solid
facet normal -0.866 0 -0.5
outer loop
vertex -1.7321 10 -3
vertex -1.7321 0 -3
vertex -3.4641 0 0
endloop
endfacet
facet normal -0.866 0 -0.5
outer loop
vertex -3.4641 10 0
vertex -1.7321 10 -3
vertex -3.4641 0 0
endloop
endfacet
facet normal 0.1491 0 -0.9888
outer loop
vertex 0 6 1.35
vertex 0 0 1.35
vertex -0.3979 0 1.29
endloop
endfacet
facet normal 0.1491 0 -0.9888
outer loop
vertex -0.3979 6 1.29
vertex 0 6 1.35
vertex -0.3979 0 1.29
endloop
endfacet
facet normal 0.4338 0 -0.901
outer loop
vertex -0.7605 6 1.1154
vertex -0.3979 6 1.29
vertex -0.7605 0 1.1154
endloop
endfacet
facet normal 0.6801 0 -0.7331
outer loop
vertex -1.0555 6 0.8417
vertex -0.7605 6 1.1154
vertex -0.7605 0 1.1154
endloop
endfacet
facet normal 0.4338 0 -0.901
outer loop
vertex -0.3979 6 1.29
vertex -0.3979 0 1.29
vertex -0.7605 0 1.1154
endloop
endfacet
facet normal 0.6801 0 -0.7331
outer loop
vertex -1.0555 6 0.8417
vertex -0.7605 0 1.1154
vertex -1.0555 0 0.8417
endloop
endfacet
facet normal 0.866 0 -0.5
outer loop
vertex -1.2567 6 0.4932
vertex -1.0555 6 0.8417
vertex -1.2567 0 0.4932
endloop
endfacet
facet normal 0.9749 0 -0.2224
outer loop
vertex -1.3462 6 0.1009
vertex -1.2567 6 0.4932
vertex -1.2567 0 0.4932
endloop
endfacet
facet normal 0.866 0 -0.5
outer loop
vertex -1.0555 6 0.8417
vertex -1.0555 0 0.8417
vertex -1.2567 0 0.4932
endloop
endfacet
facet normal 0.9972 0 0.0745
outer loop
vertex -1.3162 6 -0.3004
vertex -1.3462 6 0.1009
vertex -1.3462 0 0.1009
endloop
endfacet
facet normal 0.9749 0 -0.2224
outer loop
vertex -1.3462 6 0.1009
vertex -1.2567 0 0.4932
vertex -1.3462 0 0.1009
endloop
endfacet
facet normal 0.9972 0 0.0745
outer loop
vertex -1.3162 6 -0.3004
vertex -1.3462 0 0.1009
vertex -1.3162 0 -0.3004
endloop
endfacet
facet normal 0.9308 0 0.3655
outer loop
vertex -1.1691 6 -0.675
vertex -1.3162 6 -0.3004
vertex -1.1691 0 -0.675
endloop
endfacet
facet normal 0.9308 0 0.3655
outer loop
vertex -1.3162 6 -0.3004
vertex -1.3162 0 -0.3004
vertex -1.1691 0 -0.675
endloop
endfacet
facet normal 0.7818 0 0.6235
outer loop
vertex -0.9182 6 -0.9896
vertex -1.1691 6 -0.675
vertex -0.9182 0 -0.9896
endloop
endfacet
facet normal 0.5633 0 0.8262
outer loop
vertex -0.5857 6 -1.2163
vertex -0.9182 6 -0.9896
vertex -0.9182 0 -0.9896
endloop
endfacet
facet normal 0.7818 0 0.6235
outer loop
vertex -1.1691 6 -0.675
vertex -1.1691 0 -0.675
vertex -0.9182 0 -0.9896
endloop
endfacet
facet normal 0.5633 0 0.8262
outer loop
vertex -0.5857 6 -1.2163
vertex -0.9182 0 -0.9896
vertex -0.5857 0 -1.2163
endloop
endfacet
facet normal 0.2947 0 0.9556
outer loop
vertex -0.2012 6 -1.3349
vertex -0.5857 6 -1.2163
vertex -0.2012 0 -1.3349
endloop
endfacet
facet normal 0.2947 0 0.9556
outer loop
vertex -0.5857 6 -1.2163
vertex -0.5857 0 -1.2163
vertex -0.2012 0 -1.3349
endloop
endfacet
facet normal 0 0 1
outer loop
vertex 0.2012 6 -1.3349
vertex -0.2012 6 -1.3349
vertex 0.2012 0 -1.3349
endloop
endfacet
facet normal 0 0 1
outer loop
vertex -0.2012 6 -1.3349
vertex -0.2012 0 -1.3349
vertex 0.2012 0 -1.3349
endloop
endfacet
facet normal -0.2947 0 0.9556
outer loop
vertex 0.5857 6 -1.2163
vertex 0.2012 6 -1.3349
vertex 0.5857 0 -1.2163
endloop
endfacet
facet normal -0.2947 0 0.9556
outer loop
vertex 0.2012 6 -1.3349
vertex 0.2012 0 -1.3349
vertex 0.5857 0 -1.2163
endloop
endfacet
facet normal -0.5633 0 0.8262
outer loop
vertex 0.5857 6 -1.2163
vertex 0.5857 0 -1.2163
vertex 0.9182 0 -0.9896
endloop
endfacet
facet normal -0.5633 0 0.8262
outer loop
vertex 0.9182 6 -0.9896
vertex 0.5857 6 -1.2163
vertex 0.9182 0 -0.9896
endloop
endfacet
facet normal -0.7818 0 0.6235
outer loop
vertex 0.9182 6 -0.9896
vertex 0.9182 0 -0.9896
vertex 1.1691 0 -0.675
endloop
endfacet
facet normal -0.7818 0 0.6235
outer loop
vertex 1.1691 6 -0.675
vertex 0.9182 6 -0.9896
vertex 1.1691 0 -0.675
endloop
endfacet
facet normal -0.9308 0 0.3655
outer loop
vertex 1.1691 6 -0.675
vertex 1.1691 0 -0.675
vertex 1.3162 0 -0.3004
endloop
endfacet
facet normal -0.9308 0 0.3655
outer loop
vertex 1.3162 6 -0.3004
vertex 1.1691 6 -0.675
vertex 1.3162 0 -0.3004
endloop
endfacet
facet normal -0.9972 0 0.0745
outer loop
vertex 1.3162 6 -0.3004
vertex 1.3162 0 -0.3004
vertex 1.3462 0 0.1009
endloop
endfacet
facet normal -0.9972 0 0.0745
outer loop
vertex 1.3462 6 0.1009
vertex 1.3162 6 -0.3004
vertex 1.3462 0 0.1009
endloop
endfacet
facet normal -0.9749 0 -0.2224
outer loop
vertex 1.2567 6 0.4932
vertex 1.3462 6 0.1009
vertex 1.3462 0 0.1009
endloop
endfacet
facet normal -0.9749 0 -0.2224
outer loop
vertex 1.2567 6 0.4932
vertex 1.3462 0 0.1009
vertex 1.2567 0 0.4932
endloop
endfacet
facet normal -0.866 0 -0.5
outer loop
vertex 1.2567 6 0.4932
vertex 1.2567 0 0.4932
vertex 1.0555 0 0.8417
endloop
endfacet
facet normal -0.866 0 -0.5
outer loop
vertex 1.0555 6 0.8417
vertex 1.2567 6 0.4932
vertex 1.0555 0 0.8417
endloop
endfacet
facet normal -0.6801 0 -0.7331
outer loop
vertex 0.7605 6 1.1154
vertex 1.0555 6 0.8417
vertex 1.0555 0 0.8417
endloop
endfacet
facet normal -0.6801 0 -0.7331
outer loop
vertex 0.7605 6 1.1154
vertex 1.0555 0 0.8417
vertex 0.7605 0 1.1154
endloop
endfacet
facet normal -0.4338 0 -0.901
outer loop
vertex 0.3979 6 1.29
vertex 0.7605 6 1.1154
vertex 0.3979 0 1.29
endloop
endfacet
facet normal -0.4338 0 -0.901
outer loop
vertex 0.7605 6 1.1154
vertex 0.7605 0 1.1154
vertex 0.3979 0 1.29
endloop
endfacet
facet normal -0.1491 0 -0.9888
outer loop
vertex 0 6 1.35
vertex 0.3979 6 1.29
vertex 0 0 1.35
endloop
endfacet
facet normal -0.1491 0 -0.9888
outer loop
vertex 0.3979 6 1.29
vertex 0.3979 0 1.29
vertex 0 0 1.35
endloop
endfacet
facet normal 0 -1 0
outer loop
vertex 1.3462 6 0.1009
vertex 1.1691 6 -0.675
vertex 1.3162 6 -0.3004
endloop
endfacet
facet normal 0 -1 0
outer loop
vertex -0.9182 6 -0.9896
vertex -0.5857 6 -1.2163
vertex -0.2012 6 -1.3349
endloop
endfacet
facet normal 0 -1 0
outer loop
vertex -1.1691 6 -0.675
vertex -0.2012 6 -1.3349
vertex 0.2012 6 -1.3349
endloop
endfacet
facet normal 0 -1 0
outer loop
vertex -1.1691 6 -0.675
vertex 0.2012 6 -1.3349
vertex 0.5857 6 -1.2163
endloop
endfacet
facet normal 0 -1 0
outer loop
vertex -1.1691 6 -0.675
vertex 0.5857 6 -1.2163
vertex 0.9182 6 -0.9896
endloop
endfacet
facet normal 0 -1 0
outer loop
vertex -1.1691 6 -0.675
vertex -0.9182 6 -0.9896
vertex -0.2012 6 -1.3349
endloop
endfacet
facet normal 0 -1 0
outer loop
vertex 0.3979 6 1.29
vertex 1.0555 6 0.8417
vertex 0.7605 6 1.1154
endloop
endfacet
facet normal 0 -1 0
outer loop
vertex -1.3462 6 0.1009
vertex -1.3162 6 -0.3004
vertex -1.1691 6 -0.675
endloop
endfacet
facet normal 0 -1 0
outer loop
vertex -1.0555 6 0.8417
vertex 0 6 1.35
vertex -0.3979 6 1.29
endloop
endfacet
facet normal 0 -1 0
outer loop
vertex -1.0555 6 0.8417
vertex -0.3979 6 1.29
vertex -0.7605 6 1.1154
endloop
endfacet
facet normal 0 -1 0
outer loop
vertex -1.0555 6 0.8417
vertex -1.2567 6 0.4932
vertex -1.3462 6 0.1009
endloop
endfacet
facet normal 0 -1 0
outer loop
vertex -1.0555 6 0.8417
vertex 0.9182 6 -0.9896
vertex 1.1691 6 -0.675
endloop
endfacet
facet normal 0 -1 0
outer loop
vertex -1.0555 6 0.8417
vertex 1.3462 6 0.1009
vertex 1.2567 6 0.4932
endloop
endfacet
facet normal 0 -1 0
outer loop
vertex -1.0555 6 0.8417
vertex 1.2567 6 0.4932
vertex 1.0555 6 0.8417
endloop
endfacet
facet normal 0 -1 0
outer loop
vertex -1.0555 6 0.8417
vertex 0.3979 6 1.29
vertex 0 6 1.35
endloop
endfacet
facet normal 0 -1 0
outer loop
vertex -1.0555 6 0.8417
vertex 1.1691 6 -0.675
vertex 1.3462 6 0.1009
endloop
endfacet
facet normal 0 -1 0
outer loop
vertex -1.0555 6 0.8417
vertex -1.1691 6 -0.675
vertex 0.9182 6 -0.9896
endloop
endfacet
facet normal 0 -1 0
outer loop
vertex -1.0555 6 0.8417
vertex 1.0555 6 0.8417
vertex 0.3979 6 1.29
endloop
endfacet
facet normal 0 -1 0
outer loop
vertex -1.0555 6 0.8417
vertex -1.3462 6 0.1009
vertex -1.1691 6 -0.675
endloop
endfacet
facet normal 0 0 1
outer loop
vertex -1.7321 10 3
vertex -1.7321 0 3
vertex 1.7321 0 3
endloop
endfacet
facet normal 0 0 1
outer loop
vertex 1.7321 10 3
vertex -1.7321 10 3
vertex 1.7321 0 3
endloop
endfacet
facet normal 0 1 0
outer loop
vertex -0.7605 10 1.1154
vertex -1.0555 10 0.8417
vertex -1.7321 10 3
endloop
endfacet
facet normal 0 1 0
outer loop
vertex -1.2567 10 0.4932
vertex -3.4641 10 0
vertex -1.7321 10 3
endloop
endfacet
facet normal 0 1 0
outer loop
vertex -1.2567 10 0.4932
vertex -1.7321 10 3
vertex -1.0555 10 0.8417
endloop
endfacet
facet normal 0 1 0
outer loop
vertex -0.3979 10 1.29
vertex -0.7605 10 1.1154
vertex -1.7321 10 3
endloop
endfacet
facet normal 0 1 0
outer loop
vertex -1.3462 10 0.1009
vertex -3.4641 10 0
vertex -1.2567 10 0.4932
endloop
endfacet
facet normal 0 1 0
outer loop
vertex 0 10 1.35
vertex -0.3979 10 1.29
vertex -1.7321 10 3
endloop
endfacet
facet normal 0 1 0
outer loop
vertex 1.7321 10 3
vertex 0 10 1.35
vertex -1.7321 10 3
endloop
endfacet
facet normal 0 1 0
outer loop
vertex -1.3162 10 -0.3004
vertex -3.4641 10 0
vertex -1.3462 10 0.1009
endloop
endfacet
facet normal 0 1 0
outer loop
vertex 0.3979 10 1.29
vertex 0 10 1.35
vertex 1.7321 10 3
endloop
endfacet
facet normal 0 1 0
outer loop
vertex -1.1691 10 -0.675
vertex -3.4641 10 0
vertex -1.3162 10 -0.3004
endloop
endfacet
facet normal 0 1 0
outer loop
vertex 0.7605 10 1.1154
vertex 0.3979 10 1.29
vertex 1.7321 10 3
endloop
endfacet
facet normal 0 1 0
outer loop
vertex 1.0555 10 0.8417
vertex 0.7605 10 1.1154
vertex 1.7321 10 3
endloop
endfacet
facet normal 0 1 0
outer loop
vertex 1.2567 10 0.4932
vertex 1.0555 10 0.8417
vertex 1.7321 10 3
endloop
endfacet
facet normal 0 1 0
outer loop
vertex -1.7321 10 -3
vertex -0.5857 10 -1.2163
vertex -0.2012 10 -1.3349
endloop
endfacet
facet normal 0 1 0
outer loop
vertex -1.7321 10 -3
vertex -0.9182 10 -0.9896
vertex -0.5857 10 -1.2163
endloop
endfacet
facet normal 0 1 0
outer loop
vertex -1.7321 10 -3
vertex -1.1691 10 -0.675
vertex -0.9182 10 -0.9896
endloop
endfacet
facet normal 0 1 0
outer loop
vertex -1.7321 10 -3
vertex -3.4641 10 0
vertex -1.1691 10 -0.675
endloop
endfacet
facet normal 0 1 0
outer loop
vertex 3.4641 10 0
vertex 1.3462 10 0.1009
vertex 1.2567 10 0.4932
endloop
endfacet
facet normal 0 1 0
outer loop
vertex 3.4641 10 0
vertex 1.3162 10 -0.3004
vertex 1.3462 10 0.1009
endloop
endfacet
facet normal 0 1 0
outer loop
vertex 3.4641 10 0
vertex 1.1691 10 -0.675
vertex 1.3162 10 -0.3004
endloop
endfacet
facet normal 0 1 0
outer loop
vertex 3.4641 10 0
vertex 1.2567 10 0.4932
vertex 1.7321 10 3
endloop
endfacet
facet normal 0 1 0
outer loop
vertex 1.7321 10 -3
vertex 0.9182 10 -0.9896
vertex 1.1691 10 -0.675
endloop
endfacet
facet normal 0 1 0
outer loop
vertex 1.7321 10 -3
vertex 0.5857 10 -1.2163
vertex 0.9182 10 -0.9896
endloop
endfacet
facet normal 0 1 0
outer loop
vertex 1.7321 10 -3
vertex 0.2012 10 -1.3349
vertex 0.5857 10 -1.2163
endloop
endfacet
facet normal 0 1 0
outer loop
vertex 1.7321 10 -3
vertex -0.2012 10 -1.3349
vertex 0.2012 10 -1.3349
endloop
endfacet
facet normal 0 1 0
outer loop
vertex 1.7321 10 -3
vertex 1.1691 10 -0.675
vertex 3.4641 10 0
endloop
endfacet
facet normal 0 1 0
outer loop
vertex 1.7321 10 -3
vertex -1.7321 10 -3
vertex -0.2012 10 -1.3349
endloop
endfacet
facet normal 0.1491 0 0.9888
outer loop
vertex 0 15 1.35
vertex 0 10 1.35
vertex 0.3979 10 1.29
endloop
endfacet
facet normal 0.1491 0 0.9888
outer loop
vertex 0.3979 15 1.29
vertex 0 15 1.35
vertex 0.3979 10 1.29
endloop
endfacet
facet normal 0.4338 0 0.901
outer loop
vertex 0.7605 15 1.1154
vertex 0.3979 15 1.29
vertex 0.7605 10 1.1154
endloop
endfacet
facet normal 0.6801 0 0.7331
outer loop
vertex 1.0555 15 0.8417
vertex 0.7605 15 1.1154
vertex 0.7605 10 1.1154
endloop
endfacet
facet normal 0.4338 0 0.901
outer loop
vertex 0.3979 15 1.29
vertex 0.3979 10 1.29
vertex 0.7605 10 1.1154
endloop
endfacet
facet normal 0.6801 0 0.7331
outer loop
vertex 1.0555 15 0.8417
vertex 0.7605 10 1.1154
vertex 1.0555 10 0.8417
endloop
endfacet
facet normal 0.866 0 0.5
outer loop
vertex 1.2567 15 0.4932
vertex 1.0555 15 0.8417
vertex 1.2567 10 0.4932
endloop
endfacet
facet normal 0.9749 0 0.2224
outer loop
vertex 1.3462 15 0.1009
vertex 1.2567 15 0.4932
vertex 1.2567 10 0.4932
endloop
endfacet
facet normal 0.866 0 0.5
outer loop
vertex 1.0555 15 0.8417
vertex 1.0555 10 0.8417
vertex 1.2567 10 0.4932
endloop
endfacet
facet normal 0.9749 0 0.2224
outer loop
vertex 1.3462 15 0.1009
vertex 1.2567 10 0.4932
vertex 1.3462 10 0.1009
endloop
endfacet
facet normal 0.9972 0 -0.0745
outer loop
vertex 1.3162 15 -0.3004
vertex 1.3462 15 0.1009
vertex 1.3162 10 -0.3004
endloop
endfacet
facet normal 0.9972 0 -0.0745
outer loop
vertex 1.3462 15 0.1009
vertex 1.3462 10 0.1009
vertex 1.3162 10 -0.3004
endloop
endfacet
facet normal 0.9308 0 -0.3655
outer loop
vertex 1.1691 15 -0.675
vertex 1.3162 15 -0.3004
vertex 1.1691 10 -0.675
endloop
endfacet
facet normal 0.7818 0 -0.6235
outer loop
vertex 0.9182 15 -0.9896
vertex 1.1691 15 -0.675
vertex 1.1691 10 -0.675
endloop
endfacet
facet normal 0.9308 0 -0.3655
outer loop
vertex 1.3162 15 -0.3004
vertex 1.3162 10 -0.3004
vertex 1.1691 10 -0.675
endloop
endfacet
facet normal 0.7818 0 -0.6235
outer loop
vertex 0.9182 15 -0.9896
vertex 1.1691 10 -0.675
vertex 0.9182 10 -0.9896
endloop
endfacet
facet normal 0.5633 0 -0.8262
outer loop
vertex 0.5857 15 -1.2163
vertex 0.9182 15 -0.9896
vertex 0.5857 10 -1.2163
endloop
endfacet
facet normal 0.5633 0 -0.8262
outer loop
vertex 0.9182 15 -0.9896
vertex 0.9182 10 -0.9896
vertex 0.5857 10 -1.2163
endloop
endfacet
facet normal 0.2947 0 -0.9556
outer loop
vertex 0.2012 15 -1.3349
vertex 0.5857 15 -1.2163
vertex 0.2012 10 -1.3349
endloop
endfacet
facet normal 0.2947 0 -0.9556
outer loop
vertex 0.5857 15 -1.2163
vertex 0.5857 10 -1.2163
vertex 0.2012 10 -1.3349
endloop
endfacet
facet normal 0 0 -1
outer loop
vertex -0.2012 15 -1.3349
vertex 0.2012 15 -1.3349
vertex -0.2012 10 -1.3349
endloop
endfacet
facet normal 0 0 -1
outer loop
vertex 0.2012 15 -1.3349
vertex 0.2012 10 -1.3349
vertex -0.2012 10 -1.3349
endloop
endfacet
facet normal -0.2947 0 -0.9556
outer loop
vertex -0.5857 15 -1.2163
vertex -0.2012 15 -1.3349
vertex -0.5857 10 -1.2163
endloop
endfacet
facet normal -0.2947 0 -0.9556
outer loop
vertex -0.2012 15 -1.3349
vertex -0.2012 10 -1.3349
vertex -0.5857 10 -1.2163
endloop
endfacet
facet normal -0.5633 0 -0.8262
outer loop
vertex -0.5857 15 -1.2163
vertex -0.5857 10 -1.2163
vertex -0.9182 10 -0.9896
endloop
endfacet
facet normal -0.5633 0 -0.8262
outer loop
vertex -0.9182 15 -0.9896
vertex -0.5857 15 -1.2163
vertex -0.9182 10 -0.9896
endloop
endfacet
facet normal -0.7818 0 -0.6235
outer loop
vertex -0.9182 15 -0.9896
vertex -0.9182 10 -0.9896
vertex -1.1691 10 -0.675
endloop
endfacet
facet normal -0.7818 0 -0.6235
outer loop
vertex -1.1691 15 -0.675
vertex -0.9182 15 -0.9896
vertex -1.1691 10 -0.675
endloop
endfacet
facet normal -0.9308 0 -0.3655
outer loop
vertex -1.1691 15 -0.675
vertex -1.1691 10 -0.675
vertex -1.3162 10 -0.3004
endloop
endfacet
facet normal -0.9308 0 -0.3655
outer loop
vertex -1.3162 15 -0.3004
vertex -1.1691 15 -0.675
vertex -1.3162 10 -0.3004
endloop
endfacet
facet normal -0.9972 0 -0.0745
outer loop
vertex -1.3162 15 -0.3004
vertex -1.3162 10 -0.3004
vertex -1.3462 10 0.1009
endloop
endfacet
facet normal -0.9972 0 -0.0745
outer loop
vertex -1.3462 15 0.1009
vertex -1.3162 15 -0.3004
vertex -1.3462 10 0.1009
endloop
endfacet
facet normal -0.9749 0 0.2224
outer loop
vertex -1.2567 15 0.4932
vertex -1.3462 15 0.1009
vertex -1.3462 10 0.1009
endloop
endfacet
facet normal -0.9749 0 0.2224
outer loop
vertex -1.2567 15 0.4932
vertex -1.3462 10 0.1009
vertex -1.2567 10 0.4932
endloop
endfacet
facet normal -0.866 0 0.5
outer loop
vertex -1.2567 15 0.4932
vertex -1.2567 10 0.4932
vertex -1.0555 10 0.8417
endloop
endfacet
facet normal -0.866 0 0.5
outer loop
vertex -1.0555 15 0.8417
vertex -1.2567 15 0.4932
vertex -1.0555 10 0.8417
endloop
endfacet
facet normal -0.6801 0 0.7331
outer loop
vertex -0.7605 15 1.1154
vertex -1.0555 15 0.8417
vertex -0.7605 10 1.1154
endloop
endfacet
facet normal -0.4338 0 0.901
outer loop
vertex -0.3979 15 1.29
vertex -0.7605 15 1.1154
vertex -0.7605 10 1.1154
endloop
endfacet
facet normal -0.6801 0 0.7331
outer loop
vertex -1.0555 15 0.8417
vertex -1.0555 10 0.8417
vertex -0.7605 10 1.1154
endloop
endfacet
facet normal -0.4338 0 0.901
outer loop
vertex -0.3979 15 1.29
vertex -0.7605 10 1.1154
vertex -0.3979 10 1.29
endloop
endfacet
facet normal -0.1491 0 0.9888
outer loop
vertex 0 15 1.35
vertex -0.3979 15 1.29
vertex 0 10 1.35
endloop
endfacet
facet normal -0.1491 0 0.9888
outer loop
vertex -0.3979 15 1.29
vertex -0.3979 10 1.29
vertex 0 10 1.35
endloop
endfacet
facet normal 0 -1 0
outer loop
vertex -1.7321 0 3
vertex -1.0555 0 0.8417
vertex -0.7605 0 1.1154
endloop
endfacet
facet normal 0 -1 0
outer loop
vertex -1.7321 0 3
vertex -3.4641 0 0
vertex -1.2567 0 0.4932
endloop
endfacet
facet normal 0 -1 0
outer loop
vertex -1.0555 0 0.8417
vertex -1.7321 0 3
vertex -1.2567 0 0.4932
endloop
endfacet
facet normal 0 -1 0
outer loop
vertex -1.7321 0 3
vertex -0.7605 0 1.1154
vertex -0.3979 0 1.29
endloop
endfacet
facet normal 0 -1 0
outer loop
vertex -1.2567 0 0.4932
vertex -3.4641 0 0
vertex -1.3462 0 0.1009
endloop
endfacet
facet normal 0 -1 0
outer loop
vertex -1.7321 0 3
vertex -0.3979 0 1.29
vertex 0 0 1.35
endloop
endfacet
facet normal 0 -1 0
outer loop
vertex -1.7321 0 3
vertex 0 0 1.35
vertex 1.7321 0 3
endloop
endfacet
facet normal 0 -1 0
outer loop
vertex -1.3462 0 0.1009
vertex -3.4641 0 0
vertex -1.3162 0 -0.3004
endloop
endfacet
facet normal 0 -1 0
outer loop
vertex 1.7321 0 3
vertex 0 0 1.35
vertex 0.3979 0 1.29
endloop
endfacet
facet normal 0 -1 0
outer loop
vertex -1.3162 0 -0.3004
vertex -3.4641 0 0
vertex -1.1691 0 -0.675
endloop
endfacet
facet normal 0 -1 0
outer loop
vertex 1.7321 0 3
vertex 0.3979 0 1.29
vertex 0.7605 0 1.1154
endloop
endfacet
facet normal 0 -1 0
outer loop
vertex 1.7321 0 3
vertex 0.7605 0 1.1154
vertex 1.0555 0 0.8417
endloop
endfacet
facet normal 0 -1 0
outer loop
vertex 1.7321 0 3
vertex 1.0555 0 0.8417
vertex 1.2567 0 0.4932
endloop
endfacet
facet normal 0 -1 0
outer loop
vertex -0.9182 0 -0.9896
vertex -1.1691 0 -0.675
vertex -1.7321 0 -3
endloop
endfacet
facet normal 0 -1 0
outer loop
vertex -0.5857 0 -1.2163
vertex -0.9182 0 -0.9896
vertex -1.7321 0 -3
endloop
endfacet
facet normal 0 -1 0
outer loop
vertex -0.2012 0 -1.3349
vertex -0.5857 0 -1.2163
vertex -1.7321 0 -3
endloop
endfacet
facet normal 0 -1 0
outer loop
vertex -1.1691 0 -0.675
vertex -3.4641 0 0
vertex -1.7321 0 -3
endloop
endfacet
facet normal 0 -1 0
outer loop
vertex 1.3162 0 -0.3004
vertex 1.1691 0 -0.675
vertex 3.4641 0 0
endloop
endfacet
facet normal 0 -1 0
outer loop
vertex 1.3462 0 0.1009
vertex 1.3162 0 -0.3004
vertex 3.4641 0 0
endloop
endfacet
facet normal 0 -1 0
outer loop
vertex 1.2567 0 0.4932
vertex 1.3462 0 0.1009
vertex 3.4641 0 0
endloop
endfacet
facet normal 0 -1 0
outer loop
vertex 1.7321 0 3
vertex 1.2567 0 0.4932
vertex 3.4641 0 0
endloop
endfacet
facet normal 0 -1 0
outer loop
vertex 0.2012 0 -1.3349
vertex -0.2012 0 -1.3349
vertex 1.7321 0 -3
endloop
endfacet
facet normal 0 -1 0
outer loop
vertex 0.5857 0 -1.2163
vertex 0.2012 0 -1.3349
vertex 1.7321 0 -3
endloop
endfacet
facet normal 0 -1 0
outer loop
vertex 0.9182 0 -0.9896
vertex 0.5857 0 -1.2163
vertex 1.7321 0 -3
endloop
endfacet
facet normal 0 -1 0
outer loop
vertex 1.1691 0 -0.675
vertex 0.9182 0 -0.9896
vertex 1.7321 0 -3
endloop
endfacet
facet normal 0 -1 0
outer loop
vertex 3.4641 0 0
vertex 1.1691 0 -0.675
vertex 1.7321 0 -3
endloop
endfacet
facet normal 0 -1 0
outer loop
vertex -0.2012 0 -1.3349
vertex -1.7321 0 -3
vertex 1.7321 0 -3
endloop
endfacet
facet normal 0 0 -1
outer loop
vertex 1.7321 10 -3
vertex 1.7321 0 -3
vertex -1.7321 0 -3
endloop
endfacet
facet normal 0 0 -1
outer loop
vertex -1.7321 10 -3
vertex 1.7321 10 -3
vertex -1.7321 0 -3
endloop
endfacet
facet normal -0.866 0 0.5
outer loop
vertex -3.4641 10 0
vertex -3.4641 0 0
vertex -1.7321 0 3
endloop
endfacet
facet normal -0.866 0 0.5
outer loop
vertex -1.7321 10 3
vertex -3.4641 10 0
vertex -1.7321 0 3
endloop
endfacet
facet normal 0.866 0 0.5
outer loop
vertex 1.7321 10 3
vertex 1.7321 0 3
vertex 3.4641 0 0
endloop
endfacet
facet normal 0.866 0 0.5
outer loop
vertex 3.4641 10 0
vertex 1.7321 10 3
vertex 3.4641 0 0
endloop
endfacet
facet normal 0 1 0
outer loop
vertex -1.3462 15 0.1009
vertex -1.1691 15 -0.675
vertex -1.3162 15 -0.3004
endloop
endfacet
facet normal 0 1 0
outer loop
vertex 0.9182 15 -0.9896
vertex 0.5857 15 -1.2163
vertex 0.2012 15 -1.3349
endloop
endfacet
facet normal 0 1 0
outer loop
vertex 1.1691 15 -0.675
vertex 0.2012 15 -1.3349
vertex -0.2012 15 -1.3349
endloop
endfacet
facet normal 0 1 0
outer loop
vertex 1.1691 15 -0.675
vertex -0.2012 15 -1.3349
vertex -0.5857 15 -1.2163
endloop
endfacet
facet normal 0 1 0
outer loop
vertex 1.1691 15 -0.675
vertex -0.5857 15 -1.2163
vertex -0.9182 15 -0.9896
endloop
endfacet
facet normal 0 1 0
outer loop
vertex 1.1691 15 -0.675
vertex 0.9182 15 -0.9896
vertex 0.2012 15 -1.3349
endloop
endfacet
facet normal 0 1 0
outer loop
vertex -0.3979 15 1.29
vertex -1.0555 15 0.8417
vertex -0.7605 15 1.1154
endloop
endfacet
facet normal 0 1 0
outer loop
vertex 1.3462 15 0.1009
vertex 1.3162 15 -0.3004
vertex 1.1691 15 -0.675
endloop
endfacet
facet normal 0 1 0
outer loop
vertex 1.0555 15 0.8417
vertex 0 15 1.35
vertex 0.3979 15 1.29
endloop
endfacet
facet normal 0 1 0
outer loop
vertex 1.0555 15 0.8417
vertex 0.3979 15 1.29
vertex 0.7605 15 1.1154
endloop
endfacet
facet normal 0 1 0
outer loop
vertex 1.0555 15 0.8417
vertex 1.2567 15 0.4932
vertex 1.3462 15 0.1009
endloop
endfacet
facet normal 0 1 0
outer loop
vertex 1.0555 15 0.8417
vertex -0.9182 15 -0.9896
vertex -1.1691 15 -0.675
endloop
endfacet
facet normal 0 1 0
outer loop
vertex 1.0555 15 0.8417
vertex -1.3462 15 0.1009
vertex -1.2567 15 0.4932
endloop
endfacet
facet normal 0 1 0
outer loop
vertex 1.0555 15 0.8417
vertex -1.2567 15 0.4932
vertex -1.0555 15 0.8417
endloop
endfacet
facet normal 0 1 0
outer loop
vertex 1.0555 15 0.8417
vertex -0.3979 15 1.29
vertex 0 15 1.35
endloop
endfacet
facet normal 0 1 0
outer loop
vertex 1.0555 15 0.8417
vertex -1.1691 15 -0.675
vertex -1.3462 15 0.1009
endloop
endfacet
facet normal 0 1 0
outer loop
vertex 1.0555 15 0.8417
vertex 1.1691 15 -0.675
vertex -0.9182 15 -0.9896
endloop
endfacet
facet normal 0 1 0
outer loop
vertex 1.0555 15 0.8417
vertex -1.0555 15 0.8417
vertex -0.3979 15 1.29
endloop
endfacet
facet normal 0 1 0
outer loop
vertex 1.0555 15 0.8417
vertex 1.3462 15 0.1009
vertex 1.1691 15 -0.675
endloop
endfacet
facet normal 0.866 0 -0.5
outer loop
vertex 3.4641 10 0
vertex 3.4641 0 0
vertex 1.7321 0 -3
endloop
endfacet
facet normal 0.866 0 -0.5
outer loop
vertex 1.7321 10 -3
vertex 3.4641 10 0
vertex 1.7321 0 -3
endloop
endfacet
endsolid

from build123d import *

# Parameters (mm, degrees)
EXTRUDE_1_DEPTH     = 10
SKETCH_2_R          = 1.35
EXTRUDE_2_DEPTH     = 5
SKETCH_3_R          = 1.35
CUT_EXTRUDE_1_DEPTH = 6


with BuildPart() as part:
    # 스케치1 → 보스-돌출1 (new body)
    with BuildSketch(Plane(origin=(0, 0, 0), x_dir=(1, 0, 0), z_dir=(0, 1, 0))):
        Polygon((3.464101615, 0), (1.732050808, 3), (-1.732050808, 3), (-3.464101615, 0), (-1.732050808, -3), (1.732050808, -3), align=None)
    extrude(amount=EXTRUDE_1_DEPTH)

    # 스케치2 → 보스-돌출2 (add)
    with BuildSketch(Plane(origin=(0, 10, 0), x_dir=(1, 0, 0), z_dir=(0, 1, 0))):
        with Locations(Location((0, 0, 0), (0, 0, 270))):
            Circle(SKETCH_2_R)
    extrude(amount=EXTRUDE_2_DEPTH)

    # 스케치3 → 컷-돌출1 (cut)
    with BuildSketch(Plane.XZ):
        with Locations(Location((0, 0, 0), (0, 0, 90))):
            Circle(SKETCH_3_R)
    extrude(amount=-CUT_EXTRUDE_1_DEPTH, mode=Mode.SUBTRACT)


solid = part.part
